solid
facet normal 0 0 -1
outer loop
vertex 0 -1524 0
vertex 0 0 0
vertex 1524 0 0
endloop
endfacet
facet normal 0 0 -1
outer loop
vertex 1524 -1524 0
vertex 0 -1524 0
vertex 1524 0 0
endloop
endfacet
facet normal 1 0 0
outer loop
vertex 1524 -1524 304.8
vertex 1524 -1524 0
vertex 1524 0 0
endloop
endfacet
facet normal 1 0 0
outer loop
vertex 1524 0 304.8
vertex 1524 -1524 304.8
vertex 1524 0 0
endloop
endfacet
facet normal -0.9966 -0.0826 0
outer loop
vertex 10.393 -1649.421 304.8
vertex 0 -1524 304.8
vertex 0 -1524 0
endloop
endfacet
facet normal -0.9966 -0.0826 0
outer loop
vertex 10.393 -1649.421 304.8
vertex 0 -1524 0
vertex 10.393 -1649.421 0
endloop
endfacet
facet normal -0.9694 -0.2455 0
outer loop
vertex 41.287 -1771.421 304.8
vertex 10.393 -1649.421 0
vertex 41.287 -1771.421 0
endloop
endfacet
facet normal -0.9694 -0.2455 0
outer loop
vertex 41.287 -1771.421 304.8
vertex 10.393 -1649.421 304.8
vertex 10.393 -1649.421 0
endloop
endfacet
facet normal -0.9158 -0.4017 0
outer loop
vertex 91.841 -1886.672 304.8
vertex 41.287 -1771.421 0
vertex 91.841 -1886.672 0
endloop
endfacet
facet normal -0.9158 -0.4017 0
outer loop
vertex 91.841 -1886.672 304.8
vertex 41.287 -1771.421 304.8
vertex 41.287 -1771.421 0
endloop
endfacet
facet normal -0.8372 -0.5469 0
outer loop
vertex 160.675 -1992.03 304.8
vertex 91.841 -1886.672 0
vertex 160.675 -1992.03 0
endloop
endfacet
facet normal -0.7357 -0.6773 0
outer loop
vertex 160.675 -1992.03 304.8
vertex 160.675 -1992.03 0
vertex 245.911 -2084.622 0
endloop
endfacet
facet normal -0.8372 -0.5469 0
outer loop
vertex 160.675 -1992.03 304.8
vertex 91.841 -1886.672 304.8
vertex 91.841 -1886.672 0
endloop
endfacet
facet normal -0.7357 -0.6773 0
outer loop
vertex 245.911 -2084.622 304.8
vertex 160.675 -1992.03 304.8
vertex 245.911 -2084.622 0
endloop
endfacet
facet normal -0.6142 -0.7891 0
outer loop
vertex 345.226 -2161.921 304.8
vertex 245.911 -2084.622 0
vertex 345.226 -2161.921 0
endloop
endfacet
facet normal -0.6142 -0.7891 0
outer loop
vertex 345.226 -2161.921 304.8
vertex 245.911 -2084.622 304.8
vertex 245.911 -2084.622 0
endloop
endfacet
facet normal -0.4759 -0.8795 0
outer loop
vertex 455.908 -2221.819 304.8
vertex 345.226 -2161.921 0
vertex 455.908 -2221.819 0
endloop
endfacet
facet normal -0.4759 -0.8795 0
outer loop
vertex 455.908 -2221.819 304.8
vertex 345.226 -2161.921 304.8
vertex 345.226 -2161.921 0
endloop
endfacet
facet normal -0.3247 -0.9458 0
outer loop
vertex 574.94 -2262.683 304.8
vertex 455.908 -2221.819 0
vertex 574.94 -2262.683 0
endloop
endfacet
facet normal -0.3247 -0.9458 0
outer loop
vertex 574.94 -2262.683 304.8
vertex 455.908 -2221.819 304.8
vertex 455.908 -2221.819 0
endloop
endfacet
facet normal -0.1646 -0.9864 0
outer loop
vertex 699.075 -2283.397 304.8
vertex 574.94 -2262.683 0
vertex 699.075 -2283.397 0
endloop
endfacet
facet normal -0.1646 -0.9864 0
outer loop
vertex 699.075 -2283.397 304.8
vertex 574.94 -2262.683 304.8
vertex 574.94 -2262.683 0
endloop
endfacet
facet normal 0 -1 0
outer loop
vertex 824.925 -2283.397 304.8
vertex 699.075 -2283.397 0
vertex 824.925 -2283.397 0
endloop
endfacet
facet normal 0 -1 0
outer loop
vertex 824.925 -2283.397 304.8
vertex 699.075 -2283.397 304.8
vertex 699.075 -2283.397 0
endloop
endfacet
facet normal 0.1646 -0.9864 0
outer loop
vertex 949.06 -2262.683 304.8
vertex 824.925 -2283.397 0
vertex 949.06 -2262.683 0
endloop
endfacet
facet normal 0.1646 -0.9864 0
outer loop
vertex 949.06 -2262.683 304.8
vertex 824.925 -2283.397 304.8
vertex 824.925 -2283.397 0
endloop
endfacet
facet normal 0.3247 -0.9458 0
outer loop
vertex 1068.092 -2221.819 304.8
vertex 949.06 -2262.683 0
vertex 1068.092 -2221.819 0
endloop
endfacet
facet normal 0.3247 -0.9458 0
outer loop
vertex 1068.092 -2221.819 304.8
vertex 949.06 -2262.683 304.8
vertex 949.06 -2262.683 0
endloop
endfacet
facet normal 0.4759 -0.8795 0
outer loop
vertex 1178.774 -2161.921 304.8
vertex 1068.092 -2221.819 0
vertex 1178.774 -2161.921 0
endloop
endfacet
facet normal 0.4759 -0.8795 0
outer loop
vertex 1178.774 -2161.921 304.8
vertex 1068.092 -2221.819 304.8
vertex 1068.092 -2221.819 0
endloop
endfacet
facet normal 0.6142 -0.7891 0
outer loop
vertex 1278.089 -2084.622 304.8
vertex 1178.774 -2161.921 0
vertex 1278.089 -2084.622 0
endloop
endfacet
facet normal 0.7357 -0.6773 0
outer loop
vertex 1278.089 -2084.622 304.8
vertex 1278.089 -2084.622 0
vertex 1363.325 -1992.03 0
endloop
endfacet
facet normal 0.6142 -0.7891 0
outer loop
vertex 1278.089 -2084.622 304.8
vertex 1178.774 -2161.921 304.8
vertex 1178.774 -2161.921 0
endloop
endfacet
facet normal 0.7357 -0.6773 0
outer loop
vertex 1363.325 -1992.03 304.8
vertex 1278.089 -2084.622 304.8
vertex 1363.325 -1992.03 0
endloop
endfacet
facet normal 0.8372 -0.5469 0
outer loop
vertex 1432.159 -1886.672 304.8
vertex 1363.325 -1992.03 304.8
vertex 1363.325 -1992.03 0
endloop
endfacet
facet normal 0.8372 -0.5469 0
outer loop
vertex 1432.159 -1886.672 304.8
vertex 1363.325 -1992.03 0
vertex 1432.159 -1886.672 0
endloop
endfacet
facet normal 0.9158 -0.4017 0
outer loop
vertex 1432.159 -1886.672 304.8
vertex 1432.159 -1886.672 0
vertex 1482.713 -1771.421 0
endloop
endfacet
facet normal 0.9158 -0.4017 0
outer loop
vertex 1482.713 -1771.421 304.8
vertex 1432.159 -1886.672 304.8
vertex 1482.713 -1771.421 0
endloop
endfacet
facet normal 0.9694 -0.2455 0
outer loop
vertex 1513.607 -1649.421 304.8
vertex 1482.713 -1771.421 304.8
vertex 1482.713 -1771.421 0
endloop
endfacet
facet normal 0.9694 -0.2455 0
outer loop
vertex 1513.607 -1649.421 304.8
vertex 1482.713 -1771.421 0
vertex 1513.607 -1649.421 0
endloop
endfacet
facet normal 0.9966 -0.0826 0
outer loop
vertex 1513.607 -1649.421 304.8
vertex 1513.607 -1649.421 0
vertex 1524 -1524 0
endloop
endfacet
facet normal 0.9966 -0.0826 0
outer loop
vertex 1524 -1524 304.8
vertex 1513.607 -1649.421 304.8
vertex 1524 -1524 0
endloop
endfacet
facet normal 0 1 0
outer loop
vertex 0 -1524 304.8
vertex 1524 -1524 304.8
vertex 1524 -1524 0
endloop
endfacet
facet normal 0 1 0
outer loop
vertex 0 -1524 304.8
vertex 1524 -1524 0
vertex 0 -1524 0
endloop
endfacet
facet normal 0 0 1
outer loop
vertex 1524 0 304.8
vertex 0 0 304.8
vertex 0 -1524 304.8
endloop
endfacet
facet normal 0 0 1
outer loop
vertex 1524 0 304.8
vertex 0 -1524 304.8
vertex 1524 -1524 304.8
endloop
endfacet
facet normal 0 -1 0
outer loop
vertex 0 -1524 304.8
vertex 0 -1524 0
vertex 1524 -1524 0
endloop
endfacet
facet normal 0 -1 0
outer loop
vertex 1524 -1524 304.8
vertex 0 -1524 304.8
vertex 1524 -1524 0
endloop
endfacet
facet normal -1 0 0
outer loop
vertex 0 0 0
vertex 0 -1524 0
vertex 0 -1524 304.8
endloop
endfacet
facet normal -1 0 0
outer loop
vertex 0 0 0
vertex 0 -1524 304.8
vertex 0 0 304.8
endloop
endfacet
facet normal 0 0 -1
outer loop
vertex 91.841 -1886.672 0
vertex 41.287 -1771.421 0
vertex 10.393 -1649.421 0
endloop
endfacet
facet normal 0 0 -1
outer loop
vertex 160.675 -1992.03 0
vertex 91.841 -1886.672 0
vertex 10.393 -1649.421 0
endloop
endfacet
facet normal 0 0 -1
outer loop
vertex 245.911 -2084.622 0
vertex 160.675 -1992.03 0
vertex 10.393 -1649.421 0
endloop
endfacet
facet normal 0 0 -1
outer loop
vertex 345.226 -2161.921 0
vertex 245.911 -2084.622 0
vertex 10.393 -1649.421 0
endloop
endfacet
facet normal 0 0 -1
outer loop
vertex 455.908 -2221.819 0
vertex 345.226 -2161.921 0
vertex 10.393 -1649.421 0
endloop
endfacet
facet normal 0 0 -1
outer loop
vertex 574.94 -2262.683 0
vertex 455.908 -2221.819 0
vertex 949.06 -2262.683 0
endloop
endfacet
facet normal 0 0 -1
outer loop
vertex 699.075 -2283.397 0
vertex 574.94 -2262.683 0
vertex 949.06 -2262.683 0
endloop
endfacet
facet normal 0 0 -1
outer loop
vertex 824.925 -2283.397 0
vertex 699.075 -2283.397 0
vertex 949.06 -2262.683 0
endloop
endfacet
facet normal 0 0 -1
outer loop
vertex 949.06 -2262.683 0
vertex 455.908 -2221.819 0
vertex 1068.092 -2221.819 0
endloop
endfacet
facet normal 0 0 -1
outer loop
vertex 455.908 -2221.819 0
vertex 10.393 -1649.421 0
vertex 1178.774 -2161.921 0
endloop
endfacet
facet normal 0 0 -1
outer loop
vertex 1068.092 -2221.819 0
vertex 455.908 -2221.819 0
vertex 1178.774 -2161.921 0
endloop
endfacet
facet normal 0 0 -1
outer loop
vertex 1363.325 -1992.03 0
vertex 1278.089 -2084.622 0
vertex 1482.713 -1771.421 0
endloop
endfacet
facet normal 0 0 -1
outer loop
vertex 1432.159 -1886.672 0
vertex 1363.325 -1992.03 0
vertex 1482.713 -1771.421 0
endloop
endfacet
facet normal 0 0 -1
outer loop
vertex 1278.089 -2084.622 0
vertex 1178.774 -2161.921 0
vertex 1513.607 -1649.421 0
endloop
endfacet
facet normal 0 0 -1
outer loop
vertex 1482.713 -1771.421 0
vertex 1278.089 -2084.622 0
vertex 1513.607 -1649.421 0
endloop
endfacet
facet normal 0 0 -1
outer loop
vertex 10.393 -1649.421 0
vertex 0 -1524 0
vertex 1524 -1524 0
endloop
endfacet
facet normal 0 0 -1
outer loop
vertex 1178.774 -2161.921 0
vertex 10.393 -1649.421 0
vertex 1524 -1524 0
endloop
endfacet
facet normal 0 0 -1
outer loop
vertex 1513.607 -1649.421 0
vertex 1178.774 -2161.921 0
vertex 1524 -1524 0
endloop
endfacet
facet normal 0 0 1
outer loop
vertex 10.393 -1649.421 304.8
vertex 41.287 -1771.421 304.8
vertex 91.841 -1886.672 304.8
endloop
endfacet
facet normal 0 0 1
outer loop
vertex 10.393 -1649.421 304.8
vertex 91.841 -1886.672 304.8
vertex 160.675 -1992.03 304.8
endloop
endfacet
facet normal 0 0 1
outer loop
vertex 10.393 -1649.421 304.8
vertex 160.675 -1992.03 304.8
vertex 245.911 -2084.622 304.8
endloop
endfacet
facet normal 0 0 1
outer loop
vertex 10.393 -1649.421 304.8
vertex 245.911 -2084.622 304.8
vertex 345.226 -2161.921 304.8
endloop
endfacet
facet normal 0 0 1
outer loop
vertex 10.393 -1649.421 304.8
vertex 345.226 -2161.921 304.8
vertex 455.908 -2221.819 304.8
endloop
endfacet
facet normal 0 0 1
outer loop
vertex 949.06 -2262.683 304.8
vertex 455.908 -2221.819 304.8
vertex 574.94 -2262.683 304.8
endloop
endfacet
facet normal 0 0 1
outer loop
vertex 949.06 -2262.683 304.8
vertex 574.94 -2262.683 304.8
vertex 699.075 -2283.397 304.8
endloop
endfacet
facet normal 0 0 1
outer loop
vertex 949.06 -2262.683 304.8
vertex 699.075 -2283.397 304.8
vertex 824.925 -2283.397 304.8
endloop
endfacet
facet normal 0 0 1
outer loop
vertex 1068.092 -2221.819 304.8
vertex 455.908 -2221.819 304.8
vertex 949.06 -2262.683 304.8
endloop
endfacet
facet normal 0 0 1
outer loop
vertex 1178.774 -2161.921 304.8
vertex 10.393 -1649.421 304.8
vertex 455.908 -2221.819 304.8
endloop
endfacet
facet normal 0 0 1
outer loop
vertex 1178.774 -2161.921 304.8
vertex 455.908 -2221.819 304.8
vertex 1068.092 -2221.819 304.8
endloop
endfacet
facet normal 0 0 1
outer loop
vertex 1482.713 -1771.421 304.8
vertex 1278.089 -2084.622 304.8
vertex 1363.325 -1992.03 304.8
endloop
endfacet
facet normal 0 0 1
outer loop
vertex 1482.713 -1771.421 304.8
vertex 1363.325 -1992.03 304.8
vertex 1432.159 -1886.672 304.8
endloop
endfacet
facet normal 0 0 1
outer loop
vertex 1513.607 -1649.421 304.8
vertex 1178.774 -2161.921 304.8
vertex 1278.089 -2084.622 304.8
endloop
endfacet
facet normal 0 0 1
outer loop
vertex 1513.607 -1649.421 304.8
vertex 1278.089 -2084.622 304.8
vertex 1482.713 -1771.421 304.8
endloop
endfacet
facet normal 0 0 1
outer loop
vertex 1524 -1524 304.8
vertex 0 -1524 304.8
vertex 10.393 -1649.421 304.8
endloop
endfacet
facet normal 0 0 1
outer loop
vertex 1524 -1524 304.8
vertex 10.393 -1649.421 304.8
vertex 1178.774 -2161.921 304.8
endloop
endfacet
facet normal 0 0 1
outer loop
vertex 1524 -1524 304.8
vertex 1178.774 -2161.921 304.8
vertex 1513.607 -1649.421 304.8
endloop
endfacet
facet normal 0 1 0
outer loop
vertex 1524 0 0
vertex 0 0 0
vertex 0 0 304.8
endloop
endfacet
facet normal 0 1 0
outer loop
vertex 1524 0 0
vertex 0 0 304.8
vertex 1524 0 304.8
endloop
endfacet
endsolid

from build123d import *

# Parameters (mm, degrees)
F0_W     = 1524
F0_H     = 1524
F1_DEPTH = 304.8
F3_DEPTH = 304.8


# Not quite as in the source:
# - a feature of the source that left no trace in its solid (it failed there, or was rolled back) is left out


with BuildPart() as f1:
    # F0 (on Top) → F1 (new body)
    with BuildSketch(Plane.XY):
        with Locations((762, -762)):
            Rectangle(F0_W, F0_H)
    extrude(amount=F1_DEPTH)


with BuildPart() as f3:
    # F2 (on face) → F3 (new body)
    with BuildSketch(Plane.XY.offset(304.8)):
        with BuildLine():
            ThreePointArc((0, -1524), (762, -2286), (1524, -1524))
            Line((1524, -1524), (0, -1524))
        make_face()
    extrude(amount=-F3_DEPTH)


solid = Compound([f1.part, f3.part])
